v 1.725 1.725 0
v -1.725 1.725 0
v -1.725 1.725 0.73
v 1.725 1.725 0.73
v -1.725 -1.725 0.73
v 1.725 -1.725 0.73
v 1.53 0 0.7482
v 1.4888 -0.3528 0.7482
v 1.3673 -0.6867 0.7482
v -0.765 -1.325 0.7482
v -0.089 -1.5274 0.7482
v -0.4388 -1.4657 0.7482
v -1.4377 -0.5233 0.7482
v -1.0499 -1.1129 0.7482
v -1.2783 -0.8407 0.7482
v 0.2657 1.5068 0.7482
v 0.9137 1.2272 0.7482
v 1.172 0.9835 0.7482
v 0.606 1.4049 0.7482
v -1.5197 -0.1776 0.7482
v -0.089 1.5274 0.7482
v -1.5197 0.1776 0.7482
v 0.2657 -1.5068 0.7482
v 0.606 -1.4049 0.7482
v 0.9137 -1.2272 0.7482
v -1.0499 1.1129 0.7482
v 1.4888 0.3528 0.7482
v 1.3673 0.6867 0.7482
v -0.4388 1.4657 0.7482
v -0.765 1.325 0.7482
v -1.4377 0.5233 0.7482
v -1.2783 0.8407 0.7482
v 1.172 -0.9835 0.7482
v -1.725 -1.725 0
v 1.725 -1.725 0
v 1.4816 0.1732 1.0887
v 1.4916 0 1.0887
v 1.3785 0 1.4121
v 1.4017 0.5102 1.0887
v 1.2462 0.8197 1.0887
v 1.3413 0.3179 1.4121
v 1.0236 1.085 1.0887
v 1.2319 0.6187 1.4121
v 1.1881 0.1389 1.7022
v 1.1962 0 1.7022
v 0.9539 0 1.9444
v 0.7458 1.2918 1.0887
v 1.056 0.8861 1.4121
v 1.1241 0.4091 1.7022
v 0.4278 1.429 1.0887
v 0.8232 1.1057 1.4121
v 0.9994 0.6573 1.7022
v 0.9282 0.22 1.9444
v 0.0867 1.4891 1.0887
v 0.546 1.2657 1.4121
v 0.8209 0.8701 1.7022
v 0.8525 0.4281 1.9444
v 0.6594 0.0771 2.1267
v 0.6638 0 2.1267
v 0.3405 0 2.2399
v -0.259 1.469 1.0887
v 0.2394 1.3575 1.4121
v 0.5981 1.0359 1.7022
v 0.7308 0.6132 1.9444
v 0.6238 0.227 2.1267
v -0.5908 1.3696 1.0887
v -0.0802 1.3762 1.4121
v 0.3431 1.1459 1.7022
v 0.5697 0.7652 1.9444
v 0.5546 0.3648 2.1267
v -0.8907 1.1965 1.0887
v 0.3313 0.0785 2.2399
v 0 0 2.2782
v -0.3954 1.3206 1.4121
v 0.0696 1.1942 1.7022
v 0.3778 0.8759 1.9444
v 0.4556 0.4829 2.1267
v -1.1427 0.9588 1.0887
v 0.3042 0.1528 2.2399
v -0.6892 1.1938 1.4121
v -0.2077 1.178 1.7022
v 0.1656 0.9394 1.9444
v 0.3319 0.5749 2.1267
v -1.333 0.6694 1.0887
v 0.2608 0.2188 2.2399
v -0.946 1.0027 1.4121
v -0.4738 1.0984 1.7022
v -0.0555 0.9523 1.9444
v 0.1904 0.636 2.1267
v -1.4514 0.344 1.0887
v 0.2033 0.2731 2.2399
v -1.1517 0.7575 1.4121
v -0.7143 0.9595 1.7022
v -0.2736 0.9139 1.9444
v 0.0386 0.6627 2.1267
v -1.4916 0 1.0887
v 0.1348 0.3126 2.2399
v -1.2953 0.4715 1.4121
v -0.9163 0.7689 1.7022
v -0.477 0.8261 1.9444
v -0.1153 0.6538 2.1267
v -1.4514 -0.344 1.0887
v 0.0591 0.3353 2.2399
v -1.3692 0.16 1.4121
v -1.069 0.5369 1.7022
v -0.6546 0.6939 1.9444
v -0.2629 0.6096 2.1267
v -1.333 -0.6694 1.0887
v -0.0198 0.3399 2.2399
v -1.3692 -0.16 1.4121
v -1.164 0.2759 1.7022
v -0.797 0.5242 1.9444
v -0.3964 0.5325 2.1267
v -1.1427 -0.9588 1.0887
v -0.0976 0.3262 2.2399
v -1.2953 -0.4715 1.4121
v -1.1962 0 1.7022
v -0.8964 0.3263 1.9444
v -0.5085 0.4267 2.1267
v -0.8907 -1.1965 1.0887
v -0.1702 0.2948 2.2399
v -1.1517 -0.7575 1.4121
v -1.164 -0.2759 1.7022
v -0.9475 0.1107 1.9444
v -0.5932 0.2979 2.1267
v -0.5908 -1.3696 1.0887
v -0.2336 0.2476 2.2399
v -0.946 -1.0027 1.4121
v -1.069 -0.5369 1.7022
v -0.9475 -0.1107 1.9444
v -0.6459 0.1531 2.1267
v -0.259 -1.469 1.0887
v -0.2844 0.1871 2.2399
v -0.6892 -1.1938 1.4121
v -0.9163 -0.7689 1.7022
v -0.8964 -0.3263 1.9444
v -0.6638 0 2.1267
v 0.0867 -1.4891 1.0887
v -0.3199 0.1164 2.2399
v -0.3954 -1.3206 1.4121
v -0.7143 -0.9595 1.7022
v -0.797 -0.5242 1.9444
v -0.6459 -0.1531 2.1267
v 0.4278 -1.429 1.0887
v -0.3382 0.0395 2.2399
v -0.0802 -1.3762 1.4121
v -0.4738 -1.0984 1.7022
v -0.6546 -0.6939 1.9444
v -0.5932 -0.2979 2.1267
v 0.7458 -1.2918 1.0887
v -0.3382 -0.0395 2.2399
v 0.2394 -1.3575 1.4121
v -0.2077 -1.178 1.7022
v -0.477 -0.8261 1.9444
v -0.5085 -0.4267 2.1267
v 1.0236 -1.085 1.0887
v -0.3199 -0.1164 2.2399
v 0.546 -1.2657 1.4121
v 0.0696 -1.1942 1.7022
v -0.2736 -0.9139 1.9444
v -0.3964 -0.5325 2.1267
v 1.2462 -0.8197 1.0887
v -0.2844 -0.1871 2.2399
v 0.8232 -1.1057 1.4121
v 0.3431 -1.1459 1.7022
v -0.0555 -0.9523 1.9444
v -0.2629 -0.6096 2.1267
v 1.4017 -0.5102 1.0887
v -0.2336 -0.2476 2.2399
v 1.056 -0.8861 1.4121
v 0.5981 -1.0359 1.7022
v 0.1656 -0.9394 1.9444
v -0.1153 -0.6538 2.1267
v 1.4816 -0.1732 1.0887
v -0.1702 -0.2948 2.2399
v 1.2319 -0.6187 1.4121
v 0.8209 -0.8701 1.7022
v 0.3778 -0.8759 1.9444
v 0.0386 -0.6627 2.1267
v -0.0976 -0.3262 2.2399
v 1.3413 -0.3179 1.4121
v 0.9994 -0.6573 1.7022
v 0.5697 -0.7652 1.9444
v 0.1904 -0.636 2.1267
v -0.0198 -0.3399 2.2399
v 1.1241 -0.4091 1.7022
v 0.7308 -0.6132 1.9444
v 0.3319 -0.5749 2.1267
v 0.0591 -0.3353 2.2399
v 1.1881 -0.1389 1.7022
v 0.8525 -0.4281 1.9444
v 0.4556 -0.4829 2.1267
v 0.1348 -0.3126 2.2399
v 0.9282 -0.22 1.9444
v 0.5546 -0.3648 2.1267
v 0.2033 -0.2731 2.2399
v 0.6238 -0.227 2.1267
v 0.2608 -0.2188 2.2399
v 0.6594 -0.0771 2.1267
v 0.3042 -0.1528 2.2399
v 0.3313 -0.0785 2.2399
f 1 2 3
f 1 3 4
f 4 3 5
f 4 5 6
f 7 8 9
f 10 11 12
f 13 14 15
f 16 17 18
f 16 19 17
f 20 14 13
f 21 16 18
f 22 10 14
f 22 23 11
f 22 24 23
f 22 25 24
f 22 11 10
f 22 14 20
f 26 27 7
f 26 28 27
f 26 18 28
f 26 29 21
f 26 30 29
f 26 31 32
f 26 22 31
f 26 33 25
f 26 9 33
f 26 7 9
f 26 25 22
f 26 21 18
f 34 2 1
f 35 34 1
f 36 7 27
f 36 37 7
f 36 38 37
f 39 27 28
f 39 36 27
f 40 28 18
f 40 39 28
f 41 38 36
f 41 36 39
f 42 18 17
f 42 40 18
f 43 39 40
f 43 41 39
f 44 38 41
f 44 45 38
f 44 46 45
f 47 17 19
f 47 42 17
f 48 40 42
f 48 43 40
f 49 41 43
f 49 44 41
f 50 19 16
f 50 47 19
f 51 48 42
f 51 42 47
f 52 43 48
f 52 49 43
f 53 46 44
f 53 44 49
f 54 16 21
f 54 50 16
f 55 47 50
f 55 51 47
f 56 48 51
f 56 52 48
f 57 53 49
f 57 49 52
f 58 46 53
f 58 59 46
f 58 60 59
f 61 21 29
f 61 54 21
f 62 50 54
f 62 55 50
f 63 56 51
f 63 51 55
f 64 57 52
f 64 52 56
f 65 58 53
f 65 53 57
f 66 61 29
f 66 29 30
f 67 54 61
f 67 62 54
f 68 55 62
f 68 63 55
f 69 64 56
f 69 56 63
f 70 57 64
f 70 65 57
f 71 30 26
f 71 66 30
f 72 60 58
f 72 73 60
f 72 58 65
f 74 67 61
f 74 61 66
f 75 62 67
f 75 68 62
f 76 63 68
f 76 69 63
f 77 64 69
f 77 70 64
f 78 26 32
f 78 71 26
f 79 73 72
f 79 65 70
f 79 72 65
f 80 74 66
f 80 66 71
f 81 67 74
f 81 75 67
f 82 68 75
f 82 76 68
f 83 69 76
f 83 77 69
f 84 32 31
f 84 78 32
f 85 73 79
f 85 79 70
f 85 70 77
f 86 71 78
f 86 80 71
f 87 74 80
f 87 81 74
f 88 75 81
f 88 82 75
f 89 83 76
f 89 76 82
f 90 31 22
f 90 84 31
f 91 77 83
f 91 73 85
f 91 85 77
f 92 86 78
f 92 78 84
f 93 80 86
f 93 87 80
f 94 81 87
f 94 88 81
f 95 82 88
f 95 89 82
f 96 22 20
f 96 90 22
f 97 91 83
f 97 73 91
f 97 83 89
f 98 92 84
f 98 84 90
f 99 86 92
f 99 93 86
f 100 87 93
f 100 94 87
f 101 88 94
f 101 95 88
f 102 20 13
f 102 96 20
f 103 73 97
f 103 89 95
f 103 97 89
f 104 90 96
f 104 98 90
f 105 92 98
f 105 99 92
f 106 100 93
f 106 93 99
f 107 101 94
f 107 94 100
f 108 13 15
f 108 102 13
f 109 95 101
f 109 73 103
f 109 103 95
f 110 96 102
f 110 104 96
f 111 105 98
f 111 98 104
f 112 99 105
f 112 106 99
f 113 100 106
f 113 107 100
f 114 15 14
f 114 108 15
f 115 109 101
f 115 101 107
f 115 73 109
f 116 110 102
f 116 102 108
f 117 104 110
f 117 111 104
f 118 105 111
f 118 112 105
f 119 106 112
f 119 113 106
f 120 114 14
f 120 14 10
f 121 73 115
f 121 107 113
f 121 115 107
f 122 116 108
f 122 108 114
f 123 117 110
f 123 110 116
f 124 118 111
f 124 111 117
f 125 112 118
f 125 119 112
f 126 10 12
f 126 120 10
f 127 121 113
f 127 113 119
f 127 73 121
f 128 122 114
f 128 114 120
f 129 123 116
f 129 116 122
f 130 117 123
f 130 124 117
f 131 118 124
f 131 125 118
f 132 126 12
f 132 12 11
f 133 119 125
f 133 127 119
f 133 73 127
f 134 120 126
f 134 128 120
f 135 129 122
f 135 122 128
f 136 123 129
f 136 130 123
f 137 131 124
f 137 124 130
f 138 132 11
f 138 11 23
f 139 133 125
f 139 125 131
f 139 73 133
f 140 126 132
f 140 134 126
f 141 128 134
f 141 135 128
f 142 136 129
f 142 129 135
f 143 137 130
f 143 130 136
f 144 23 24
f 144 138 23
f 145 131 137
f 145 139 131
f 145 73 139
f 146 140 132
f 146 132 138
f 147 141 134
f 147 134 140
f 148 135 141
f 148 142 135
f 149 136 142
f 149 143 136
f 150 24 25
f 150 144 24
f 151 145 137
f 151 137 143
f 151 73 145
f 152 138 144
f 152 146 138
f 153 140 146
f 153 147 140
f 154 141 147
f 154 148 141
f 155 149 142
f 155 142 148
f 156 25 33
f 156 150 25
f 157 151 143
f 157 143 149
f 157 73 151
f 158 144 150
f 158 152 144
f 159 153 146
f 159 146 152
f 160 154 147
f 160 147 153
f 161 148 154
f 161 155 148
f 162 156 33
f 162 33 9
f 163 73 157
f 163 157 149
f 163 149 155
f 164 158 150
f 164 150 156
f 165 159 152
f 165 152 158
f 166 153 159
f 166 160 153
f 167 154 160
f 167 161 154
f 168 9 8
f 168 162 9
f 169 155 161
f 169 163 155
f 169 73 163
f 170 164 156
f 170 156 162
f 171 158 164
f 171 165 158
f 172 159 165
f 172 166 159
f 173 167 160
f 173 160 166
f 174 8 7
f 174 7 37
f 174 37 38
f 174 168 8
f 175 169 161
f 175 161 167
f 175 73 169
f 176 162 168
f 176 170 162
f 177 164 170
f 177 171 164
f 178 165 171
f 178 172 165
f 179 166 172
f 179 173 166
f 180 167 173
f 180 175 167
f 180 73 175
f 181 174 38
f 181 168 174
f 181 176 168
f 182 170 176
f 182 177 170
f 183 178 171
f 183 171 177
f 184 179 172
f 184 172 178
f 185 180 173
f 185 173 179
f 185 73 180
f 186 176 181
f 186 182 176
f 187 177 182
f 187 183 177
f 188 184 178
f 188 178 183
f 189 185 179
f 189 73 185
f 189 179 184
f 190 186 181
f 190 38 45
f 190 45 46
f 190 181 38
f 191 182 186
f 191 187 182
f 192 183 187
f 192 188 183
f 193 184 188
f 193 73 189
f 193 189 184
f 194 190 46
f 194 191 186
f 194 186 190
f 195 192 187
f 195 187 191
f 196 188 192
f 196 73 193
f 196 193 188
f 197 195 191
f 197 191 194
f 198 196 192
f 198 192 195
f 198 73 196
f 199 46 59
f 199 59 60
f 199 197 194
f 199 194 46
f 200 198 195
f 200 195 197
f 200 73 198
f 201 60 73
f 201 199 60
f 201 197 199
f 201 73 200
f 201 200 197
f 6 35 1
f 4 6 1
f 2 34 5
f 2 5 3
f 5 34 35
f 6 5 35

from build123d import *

# Parameters (mm, degrees)
F0_W     = 3.45
F0_H     = 3.45
F1_DEPTH = 0.73


with BuildPart() as f1:
    # F0 (on Top) → F1 (new body)
    with BuildSketch(Plane.XY):
        Rectangle(F0_W, F0_H)
    extrude(amount=F1_DEPTH)


with BuildPart() as f4:
    # F3 (on Front) → F4 (revolve)
    with BuildSketch(Plane.XZ):
        with BuildLine():
            Line((0, 2.26), (0, 0.7482266519))
            Line((0, 0.7482266519), (1.53, 0.7482266519))
            ThreePointArc((1.53, 0.7482266519), (1.0818733752, 1.8301000271), (0, 2.2782266519))
            Line((0, 2.2782266519), (0, 2.26))
        make_face()
    revolve(axis=Axis((0, 0, 0.73), (0, 0, 1)))


solid = Compound([f1.part, f4.part])
